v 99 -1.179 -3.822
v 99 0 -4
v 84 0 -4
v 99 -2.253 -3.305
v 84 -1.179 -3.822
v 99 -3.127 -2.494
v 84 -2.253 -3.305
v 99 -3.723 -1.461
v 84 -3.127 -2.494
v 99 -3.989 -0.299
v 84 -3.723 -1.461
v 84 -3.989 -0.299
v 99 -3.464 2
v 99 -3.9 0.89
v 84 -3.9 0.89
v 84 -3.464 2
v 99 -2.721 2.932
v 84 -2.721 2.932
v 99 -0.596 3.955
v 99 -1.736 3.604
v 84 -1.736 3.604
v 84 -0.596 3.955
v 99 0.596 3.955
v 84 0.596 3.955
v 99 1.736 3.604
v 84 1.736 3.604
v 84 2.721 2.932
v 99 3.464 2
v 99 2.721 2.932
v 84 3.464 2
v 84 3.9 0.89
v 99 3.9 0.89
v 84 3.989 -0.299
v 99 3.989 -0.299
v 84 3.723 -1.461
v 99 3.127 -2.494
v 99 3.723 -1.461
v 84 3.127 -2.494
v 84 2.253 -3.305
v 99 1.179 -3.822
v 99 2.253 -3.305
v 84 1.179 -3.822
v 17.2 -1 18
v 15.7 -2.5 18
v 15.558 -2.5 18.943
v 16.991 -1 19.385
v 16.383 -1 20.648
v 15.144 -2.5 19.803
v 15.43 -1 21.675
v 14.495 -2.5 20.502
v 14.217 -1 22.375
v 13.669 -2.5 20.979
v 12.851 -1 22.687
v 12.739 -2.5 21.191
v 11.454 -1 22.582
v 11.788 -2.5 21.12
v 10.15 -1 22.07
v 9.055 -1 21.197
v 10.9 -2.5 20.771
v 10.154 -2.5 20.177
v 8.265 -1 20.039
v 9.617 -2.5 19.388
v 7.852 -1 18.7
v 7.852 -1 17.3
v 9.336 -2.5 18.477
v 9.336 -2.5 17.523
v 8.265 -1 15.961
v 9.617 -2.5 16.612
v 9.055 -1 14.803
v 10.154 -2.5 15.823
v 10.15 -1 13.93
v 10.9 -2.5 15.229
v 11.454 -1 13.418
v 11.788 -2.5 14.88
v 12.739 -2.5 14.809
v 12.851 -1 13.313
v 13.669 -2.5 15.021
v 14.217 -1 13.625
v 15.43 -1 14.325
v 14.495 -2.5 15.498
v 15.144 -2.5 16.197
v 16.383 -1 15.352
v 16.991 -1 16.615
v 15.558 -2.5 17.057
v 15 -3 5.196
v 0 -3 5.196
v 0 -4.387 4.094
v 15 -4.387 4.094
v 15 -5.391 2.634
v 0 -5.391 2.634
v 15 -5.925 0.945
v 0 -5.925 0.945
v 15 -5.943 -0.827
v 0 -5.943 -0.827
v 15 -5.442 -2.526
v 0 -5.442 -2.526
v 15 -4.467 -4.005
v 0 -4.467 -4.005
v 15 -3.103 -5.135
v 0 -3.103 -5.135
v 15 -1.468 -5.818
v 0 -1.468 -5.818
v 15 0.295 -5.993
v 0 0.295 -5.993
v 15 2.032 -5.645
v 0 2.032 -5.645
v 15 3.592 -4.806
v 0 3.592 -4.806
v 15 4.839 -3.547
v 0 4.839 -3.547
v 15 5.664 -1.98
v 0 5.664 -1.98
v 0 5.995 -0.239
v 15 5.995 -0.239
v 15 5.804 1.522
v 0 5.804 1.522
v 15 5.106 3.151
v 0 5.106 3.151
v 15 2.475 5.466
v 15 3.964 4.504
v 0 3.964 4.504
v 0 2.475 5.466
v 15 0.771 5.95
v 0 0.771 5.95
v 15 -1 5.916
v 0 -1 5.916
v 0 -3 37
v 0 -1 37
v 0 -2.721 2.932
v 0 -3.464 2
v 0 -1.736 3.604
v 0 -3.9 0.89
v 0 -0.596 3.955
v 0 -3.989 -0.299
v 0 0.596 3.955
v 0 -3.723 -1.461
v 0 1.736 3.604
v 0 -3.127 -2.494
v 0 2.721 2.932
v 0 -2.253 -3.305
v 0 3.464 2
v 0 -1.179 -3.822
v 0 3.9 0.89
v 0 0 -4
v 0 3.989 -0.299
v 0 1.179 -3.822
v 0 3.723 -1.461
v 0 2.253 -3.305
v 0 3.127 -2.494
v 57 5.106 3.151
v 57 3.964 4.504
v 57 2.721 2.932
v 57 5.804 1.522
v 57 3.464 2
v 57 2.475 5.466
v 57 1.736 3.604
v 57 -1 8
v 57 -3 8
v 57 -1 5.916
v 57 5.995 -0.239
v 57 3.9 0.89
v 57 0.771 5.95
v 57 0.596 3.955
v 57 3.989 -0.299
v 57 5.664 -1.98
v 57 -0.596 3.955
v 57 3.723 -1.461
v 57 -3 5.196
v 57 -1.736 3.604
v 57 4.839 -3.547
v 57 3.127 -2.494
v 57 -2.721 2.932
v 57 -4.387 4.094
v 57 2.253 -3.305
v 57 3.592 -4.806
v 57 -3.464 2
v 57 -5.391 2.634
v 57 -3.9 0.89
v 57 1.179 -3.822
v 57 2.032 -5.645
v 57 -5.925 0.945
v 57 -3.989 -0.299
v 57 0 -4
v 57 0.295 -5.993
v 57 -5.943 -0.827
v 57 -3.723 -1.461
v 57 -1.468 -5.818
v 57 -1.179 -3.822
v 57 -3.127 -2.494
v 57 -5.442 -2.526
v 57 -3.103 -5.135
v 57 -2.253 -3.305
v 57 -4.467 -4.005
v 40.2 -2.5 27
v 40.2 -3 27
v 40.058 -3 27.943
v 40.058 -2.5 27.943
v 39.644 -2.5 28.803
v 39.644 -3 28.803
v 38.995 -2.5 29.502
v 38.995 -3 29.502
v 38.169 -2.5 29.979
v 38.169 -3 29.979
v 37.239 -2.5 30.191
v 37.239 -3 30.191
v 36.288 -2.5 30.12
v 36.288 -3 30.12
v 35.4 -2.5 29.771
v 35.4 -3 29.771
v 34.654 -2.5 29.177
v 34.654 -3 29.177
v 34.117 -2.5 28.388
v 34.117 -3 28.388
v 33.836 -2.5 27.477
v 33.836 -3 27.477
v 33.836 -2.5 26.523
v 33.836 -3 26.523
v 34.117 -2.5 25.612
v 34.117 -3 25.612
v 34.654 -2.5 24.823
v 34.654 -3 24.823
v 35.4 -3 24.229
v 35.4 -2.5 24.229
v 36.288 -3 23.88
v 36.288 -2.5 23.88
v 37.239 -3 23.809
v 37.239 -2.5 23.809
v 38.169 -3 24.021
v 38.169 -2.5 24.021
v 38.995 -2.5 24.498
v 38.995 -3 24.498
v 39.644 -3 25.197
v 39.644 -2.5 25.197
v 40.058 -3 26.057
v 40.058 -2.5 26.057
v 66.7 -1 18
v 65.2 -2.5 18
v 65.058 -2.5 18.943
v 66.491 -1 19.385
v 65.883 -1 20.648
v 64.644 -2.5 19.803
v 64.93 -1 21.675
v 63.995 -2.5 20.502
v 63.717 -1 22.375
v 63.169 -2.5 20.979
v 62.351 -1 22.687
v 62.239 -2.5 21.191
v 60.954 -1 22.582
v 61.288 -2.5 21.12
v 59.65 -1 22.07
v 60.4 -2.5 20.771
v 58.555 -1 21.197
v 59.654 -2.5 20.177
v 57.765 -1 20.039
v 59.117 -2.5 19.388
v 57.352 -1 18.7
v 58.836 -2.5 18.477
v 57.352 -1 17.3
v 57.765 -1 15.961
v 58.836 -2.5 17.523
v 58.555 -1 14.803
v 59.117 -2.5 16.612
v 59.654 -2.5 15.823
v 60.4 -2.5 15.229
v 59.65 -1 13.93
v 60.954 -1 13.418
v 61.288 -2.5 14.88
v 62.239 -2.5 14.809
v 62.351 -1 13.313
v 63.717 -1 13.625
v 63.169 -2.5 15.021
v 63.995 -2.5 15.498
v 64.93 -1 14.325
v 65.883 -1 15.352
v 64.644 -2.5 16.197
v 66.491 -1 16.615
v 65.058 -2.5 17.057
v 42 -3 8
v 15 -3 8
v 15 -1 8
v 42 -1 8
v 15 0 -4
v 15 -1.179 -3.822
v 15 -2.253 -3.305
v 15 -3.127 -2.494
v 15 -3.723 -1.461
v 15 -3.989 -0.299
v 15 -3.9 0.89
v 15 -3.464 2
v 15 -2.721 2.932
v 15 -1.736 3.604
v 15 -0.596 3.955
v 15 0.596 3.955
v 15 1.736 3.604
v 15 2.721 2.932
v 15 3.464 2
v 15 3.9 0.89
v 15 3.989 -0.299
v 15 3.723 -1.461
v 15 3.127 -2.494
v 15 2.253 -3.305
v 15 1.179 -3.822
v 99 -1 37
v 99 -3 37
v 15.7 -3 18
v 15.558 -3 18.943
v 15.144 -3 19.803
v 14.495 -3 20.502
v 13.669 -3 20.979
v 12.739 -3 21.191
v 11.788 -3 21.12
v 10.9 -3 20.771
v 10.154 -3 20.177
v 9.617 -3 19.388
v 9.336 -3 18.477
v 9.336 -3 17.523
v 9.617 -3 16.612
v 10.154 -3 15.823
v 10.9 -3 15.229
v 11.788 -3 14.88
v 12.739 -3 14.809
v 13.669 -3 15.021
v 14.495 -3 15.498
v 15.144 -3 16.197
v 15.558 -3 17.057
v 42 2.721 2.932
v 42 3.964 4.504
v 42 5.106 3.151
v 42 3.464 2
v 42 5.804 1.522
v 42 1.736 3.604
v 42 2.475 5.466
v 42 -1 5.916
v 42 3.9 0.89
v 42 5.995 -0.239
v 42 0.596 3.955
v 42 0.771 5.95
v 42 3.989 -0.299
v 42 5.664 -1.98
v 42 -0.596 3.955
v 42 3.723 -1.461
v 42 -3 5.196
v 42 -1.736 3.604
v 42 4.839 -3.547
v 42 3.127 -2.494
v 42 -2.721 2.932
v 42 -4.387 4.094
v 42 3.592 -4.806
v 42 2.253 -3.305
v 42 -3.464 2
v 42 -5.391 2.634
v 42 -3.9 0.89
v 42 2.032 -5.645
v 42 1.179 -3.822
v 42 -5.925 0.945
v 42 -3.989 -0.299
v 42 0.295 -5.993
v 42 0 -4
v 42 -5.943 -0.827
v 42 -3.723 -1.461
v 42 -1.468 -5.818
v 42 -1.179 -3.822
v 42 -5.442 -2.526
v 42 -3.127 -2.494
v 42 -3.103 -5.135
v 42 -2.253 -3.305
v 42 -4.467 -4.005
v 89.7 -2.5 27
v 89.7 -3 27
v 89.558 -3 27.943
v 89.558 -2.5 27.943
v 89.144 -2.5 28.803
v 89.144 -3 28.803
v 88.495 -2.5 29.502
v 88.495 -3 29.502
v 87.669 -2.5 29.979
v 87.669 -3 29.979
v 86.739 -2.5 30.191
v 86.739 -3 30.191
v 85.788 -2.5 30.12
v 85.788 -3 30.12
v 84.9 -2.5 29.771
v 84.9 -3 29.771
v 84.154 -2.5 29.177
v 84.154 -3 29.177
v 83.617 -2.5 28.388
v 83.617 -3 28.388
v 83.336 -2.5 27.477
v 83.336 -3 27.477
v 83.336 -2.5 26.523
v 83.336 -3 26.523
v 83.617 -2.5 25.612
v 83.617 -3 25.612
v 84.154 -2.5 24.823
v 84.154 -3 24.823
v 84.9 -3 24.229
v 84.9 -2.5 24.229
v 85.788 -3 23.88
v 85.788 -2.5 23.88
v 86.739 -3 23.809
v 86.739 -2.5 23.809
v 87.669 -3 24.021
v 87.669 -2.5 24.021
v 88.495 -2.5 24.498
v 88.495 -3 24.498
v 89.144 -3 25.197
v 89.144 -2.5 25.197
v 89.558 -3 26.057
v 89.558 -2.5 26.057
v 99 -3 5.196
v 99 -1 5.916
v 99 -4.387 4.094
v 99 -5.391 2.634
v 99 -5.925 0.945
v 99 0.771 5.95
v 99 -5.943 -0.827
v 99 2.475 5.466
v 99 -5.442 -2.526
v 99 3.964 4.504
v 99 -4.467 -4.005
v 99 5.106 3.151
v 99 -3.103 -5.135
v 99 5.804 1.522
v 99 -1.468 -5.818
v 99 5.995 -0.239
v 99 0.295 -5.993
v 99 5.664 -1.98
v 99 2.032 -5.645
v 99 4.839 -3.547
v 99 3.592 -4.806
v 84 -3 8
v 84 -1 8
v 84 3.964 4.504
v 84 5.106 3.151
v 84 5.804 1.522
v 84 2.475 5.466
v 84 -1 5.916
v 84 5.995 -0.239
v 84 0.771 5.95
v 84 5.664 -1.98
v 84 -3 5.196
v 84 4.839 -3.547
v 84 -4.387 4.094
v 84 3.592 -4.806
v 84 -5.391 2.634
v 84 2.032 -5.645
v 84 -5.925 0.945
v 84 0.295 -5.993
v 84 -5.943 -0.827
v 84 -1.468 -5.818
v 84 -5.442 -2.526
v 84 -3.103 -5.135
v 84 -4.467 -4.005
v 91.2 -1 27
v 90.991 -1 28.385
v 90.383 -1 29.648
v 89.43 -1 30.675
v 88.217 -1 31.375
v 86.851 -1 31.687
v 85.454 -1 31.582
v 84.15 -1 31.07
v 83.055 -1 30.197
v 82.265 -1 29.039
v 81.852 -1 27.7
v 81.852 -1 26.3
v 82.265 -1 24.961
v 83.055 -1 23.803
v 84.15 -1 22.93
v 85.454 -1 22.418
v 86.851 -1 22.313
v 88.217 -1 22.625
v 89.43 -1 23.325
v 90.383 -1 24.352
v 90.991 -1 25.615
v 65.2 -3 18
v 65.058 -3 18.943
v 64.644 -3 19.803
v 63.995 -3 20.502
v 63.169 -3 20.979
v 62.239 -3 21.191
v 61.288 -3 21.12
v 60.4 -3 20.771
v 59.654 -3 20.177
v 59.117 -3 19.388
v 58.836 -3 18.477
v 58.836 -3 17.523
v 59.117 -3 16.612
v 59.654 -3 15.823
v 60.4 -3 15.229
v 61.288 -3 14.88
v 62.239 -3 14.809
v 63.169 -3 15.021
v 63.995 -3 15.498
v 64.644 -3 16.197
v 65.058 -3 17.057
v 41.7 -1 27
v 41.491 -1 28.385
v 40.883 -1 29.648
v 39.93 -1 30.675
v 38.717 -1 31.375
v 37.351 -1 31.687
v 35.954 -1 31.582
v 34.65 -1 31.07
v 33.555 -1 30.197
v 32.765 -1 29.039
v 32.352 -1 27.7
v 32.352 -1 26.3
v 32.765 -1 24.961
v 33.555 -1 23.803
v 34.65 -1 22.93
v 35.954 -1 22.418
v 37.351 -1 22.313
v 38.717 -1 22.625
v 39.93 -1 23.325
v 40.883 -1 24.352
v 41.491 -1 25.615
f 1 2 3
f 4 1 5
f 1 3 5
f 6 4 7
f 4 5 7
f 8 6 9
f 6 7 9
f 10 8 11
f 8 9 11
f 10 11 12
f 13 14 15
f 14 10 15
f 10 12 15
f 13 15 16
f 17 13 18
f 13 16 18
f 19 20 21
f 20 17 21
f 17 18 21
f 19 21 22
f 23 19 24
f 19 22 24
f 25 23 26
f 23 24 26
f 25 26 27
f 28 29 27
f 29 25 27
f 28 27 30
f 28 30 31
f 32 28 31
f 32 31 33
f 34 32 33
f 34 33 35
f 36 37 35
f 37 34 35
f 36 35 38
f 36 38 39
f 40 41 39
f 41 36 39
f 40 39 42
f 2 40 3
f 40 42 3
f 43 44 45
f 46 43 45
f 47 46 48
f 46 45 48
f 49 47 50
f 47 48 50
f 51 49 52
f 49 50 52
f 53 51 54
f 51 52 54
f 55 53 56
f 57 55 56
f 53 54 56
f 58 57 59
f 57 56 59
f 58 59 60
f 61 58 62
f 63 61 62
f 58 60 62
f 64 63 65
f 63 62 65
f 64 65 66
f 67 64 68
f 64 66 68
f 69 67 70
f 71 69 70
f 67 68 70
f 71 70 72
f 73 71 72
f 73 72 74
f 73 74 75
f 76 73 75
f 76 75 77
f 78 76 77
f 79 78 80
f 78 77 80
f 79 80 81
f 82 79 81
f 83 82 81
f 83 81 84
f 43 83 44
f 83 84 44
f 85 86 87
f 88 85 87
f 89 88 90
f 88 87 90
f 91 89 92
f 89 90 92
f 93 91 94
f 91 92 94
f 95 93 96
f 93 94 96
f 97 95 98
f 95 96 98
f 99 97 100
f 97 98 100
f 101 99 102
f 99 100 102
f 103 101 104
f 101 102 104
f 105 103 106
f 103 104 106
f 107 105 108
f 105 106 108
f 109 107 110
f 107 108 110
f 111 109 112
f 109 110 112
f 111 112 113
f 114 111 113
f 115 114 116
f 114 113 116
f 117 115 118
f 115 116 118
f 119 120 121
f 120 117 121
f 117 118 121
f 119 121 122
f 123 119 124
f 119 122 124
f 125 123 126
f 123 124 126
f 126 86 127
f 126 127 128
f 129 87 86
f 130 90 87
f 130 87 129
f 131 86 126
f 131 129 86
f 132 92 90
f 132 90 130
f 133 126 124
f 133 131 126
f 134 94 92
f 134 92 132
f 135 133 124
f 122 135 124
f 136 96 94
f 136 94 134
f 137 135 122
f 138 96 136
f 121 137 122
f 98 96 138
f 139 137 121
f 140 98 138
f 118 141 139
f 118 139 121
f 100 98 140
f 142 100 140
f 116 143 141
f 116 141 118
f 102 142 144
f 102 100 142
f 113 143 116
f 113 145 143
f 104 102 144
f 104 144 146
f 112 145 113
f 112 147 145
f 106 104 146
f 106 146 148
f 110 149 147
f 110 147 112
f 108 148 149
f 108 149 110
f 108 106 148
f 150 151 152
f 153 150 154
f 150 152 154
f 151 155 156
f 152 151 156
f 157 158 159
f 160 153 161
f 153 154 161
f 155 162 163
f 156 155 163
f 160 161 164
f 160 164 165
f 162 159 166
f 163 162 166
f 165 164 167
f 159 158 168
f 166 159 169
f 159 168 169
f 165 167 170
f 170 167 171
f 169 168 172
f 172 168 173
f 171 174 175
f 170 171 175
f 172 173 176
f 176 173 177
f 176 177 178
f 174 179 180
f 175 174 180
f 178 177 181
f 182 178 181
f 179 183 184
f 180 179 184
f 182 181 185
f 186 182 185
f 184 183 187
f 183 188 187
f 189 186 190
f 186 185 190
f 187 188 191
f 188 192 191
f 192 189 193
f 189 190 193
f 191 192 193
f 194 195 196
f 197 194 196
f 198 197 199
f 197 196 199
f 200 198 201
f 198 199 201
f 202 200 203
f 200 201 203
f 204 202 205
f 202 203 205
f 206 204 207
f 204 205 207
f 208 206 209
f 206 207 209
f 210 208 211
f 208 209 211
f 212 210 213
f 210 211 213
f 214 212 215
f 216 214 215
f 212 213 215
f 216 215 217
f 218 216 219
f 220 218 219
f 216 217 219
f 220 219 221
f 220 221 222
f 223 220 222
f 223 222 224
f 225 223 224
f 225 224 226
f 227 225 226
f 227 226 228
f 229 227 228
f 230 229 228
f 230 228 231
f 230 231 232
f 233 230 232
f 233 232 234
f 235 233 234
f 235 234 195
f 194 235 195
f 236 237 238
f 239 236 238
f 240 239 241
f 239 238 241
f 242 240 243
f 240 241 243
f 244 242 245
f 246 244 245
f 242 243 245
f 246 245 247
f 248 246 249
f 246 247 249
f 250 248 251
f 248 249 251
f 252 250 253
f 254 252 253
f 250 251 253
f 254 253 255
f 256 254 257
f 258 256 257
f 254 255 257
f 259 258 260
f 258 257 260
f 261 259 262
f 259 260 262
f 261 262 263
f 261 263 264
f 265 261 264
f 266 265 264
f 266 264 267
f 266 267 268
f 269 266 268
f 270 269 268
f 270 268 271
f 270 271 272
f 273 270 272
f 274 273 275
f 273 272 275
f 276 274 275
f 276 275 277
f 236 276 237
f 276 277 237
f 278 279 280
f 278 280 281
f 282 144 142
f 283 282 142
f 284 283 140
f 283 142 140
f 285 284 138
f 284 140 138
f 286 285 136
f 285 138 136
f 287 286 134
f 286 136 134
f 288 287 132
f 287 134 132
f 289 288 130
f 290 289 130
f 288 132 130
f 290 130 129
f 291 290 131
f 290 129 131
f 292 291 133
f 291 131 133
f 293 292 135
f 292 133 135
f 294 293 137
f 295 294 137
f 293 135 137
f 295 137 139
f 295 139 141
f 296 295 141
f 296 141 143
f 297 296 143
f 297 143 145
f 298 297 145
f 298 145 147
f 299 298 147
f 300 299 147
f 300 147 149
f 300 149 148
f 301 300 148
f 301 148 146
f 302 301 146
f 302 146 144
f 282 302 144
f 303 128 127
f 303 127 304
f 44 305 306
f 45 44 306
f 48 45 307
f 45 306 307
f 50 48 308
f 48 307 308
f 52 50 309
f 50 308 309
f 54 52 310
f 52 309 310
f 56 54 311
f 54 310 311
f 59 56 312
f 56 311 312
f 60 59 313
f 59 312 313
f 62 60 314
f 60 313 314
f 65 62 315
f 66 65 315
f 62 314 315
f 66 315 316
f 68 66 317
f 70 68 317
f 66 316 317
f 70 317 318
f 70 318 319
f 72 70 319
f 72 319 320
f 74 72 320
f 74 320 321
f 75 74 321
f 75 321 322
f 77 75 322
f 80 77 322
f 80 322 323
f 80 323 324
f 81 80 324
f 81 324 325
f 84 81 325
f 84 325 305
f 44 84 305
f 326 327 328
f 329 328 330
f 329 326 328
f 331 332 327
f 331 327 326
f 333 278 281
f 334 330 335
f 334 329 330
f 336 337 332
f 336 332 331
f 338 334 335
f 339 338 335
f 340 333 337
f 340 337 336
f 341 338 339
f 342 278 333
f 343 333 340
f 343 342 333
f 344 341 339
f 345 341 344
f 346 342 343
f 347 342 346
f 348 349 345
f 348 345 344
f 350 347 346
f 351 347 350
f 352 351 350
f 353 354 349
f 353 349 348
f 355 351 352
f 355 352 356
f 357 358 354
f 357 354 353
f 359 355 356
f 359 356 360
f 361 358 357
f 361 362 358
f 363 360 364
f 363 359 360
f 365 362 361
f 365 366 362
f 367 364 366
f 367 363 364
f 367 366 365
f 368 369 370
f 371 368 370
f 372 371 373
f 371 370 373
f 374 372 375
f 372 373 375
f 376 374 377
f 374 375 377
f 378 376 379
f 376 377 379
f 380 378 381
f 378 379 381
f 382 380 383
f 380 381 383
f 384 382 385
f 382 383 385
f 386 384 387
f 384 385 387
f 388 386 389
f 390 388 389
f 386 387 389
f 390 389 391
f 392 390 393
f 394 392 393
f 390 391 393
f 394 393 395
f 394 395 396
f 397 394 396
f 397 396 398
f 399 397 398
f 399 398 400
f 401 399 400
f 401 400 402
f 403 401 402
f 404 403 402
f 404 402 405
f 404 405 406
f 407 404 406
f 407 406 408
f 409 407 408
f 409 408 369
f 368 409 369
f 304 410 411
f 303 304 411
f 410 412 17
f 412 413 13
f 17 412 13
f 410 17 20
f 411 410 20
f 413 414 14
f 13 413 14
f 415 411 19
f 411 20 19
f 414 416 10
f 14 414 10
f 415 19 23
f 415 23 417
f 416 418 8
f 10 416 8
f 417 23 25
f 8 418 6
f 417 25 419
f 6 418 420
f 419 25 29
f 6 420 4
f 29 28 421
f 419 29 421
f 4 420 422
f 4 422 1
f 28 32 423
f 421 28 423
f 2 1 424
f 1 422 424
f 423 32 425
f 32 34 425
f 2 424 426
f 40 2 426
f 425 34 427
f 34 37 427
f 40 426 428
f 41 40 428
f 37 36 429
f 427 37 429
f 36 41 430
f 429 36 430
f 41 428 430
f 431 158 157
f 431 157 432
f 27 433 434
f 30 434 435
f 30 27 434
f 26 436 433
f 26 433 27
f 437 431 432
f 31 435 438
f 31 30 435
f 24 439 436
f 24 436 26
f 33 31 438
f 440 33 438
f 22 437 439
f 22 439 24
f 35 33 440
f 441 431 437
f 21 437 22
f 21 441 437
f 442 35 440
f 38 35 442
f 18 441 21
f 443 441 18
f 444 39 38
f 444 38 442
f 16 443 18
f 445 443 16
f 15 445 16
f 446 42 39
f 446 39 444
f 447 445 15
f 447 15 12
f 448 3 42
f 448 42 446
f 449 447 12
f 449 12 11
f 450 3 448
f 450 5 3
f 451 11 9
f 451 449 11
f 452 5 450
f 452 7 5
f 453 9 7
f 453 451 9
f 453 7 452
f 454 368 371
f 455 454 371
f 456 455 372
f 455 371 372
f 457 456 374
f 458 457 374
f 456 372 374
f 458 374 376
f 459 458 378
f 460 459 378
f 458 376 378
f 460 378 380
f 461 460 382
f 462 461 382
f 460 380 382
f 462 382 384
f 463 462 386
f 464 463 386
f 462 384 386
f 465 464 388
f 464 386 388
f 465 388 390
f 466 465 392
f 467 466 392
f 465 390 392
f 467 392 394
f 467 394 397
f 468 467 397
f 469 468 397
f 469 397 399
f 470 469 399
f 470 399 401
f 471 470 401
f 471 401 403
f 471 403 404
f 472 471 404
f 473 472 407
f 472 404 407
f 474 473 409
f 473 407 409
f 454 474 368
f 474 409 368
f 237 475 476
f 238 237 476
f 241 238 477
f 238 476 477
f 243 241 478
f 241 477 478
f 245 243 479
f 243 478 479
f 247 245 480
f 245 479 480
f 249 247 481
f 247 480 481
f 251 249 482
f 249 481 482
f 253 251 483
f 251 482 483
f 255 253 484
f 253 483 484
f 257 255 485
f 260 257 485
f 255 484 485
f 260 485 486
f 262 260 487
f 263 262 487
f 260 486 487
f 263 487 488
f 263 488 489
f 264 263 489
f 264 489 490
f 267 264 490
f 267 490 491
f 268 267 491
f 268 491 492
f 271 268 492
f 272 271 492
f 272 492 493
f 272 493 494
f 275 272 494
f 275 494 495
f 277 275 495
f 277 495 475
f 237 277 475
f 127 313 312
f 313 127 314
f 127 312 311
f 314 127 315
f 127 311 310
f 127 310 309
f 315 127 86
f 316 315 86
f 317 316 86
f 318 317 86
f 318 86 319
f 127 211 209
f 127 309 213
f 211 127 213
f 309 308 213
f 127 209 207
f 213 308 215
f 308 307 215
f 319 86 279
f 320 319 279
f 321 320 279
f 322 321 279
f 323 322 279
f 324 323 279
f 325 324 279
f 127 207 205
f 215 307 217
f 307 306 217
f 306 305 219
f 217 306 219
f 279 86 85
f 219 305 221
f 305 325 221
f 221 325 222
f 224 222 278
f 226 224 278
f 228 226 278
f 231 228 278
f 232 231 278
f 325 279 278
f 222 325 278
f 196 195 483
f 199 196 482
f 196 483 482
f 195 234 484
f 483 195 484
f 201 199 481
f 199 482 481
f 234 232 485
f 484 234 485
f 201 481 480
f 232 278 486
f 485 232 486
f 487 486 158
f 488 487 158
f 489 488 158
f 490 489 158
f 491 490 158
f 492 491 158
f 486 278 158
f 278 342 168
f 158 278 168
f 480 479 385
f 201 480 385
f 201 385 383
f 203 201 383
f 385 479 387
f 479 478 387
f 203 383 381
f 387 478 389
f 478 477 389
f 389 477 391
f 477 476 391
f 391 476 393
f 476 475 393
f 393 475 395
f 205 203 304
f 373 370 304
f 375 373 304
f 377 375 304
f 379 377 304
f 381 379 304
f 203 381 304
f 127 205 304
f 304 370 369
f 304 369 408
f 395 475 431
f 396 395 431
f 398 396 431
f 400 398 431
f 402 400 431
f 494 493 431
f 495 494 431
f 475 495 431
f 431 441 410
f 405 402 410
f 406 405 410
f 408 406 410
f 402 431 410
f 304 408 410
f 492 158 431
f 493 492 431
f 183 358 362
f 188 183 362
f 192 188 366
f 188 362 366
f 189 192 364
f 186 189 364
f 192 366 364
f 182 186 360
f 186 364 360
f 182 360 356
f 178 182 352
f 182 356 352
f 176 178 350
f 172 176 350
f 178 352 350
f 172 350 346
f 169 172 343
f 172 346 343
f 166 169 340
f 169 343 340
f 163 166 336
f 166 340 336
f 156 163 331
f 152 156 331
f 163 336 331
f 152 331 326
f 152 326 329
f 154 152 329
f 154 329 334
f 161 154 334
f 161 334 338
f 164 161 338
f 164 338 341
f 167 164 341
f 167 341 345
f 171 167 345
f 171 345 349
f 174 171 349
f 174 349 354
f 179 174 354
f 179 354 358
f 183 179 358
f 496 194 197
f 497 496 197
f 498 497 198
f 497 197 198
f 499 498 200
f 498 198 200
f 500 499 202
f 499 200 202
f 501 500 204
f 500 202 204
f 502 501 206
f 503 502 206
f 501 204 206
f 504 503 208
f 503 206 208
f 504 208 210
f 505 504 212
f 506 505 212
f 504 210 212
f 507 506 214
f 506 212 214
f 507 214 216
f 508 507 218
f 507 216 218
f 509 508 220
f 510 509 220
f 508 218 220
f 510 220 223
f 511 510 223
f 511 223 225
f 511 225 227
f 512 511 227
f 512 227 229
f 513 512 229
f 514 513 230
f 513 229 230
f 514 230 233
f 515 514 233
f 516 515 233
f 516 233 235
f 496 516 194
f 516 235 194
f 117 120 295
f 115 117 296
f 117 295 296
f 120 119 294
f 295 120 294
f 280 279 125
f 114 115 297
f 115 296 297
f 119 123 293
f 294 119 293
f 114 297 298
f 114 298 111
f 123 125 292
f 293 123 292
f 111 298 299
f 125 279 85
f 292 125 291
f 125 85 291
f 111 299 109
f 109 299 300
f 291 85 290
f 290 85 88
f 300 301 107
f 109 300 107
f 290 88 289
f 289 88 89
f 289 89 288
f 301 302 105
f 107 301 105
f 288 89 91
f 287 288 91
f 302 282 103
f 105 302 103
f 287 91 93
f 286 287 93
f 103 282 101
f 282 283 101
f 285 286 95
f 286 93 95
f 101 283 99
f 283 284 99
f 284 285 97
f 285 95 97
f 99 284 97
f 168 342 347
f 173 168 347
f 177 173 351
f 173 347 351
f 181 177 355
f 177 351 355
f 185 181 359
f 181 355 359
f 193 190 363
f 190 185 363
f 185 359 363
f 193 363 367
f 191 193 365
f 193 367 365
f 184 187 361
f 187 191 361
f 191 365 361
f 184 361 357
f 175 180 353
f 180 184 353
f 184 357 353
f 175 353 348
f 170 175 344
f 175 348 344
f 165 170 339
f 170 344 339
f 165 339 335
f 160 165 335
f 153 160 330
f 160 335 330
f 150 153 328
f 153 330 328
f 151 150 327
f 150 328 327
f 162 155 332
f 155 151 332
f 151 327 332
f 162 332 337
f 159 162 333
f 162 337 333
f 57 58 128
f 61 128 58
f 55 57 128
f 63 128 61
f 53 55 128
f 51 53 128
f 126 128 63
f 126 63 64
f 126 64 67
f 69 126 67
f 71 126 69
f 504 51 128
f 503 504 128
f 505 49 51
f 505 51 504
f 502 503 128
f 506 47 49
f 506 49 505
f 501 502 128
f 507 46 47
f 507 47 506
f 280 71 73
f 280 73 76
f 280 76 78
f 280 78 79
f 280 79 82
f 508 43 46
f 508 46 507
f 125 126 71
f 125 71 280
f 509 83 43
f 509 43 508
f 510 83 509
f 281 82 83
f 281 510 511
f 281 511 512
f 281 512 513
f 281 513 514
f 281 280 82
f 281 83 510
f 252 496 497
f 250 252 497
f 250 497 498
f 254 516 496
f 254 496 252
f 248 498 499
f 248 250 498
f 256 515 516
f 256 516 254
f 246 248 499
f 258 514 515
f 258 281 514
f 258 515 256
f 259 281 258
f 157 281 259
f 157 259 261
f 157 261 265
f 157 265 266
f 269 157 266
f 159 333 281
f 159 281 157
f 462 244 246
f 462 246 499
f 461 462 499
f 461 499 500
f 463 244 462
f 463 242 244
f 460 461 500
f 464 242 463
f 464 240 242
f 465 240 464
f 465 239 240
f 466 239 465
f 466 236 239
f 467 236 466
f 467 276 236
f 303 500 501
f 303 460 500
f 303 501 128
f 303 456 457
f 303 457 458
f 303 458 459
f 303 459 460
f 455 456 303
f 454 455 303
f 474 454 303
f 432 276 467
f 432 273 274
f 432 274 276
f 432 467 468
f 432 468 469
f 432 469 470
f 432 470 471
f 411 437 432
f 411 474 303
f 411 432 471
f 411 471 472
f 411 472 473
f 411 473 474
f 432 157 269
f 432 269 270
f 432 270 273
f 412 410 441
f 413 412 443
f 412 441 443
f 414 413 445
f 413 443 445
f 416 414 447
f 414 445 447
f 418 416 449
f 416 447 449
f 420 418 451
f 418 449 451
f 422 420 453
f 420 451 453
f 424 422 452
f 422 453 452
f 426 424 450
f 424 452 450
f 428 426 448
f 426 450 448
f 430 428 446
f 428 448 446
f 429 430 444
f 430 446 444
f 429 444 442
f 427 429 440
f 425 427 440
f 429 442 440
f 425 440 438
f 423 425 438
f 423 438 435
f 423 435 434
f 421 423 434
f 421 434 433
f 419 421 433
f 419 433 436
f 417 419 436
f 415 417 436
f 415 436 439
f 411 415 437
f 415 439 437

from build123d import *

# Parameters (mm, degrees)
SKETCH_1_R               = 6
SKETCH_1_R_2             = 4
EXTRUDE_1_DEPTH          = 99
SKETCH_2_W               = 99
SKETCH_2_H               = 2
EXTRUDE_2_DEPTH          = 37
SKETCH_3_R               = 4
CUT_EXTRUDE_1_DEPTH      = 106.858395983
CUT_EXTRUDE_2_DEPTH      = 106.919780967
CUT_EXTRUDE_2_DEPTH_BACK = 106.919780967
SKETCH_4_W               = 27
SKETCH_4_H               = 14
SKETCH_7_R               = 3.2
CUT_EXTRUDE_8_DEPTH      = 37
CHAMFER_1_SIZE           = 1.5


with BuildPart() as part:
    # 草图1 → 凸台-拉伸1 (new body)
    with BuildSketch(Plane(origin=(0, 0, 0), x_dir=(0, 0, -1), z_dir=(1, 0, 0))):
        Circle(SKETCH_1_R)
        Circle(SKETCH_1_R_2, mode=Mode.SUBTRACT)
    extrude(amount=EXTRUDE_1_DEPTH)

    # 草图2 → 凸台-拉伸2 (add)
    with BuildSketch(Plane.XY):
        with Locations((49.5, -2)):
            Rectangle(SKETCH_2_W, SKETCH_2_H)
    extrude(amount=EXTRUDE_2_DEPTH)

    # 草图3 → 切除-拉伸1 (cut, through all)
    with BuildSketch(Plane.ZY):
        with Locations(Location((0, 0, 0), (0, 0, 180))):
            Circle(SKETCH_3_R)
    extrude(amount=-CUT_EXTRUDE_1_DEPTH, mode=Mode.SUBTRACT)

    # 草图4 → 切除-拉伸2 (cut, two sides: drawn at the far end of the back side and taken through both)
    with BuildSketch(Plane(origin=(0, -1, 0), x_dir=(1, 0, 0), z_dir=(0, 1, 0)).offset(-CUT_EXTRUDE_2_DEPTH_BACK)):
        with Locations((28.5, -1)):
            Rectangle(SKETCH_4_W, SKETCH_4_H)
        with Locations((70.5, -1)):
            Rectangle(SKETCH_4_W, SKETCH_4_H)
    extrude(amount=CUT_EXTRUDE_2_DEPTH + CUT_EXTRUDE_2_DEPTH_BACK, mode=Mode.SUBTRACT)

    # 草图7 → 切除-拉伸8 (cut)
    with BuildSketch(Plane.XZ.offset(3)):
        with Locations((12.5, 18)):
            Circle(SKETCH_7_R)
        with Locations((37, 27)):
            Circle(SKETCH_7_R)
        with Locations((62, 18)):
            Circle(SKETCH_7_R)
        with Locations((86.5, 27)):
            Circle(SKETCH_7_R)
    extrude(amount=-CUT_EXTRUDE_8_DEPTH, mode=Mode.SUBTRACT)

    # 倒角1
    chamfer_1_edges = [part.edges().sort_by_distance(p)[0] for p in [
        (9.3, -1, 18),
        (33.8, -1, 27),
        (58.8, -1, 18),
        (83.3, -1, 27),
    ]]
    chamfer(chamfer_1_edges, length=CHAMFER_1_SIZE)


solid = part.part
